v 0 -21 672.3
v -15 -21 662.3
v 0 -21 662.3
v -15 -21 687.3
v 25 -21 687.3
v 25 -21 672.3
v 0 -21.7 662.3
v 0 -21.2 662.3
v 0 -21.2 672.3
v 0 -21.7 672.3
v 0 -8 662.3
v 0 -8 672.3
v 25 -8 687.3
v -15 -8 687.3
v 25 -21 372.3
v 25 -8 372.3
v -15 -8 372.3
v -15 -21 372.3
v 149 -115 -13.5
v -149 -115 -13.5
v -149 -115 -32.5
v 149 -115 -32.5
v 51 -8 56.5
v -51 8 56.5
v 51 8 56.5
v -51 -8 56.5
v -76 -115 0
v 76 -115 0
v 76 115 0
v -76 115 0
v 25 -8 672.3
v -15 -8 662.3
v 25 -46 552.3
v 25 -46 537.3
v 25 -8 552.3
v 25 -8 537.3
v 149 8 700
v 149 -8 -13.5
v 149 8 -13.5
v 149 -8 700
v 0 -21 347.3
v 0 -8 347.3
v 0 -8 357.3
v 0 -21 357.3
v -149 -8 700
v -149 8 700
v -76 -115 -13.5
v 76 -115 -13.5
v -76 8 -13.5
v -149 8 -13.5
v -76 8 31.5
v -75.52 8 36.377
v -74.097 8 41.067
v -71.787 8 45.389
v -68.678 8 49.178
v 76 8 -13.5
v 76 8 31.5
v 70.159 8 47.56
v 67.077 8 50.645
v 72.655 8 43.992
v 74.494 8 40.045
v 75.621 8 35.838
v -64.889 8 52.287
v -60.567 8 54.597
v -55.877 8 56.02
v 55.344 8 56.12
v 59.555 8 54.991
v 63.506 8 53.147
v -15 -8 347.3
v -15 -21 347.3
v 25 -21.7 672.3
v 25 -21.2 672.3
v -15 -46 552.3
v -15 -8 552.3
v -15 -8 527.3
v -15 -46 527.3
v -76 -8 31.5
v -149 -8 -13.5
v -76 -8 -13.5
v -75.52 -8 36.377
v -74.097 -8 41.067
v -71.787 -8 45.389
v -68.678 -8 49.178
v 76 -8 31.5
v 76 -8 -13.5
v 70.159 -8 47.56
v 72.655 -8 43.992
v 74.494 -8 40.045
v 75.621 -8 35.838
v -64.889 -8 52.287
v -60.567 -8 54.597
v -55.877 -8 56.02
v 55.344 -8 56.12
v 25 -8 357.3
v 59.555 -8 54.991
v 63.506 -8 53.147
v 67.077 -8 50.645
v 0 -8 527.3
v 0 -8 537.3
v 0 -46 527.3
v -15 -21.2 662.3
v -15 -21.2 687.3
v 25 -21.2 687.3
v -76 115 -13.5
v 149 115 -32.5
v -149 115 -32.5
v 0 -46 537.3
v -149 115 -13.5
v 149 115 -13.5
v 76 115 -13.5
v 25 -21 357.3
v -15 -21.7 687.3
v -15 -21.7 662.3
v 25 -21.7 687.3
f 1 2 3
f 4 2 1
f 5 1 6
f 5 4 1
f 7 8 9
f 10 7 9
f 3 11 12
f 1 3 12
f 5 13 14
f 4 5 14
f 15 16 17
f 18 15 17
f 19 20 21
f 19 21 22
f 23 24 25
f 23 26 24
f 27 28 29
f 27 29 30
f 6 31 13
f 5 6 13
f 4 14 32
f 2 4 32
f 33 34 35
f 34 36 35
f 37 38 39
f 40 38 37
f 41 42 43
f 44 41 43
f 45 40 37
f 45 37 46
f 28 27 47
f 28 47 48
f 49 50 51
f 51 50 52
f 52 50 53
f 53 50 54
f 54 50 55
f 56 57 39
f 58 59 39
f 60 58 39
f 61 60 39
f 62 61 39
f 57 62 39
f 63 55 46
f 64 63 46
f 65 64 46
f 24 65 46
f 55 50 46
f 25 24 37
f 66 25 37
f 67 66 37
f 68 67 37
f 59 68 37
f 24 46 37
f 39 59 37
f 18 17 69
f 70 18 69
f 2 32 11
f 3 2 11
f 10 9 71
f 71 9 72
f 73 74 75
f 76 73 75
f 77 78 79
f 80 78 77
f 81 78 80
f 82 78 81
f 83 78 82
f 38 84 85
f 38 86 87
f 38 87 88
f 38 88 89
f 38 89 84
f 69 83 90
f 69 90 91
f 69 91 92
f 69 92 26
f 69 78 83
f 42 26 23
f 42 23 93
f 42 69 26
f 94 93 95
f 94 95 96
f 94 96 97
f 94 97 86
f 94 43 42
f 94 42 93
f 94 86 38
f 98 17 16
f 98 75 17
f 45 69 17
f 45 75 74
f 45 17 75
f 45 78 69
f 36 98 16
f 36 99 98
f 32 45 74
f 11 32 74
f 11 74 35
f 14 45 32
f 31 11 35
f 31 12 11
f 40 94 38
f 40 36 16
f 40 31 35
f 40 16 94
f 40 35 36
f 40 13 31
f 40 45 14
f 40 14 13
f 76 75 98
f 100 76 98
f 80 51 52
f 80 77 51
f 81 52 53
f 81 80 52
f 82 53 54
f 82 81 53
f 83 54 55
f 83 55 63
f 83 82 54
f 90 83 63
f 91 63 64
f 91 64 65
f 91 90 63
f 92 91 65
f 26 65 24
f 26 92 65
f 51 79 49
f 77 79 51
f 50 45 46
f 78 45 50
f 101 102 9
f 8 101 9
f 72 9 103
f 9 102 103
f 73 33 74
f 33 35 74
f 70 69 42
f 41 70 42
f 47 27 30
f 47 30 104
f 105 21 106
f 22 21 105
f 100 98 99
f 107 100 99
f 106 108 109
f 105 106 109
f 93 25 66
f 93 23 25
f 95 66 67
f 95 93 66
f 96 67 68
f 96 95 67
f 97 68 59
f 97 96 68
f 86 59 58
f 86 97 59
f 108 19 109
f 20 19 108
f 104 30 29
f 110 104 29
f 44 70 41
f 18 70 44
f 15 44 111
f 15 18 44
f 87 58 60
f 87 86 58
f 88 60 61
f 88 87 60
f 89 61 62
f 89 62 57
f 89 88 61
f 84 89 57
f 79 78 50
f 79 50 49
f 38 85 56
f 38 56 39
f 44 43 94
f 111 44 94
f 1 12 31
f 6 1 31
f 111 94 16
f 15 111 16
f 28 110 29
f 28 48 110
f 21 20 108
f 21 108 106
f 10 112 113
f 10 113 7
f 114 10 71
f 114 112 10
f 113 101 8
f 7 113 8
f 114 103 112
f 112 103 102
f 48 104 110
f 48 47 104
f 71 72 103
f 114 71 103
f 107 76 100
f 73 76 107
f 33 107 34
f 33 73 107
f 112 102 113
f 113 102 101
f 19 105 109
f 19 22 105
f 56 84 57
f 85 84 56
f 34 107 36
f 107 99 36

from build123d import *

# Parameters (mm, degrees)
F1_DEPTH      = 115
F1_DEPTH_BACK = 115
F2_DEPTH      = 115
F2_DEPTH_BACK = 115
F3_DEPTH      = 8
F3_DEPTH_BACK = 8
F4_DEPTH      = 21
F4_DEPTH_BACK = 8
F5_DEPTH      = 21
F5_DEPTH_BACK = 8
F6_DEPTH      = 21
F6_DEPTH_BACK = 8
F9_DEPTH      = 0.5
F11_DEPTH     = 25


with BuildPart() as f1:
    # F0 (on Front) → F1 (new body, two sides)
    with BuildSketch(Plane.XZ) as f1_sk:
        Polygon((76, -13.5), (76, 0), (0, 0), (-76, 0), (-76, -13.5), align=None)
    extrude(amount=F1_DEPTH)
    extrude(f1_sk.sketch, amount=-F1_DEPTH_BACK)


with BuildPart() as f2:
    # F0 (on Front) → F2 (new body, two sides)
    with BuildSketch(Plane.XZ) as f2_sk:
        Polygon((149, -13.5), (76, -13.5), (-76, -13.5), (-149, -13.5), (-149, -32.5), (149, -32.5), align=None)
    extrude(amount=F2_DEPTH)
    extrude(f2_sk.sketch, amount=-F2_DEPTH_BACK)


with BuildPart() as f3:
    # F0 (on Front) → F3 (new body, two sides)
    with BuildSketch(Plane.XZ) as f3_sk:
        with BuildLine():
            Line((76, 31.5), (76, 0))
            Line((76, 0), (76, -13.5))
            Line((76, -13.5), (149, -13.5))
            Line((149, -13.5), (149, 700))
            Line((149, 700), (-149, 700))
            Line((-149, 700), (-149, -13.5))
            Line((-149, -13.5), (-76, -13.5))
            Line((-76, -13.5), (-76, 0))
            Line((-76, 0), (-76, 31.5))
            ThreePointArc((-76, 31.5), (-68.6776695297, 49.1776695297), (-51, 56.5))
            Line((-51, 56.5), (51, 56.5))
            ThreePointArc((51, 56.5), (61.5710197798, 54.1550996647), (70.1590005334, 47.5602832653))
            ThreePointArc((70.1590005334, 47.5602832653), (74.4944143717, 40.044734831), (76, 31.5))
        make_face()
        Polygon((25, 357.3), (0, 357.3), (0, 347.3), (-15, 347.3), (-15, 372.3), (25, 372.3), align=None, mode=Mode.SUBTRACT)
        Polygon((25, 537.3), (0, 537.3), (0, 527.3), (-15, 527.3), (-15, 552.3), (25, 552.3), align=None, mode=Mode.SUBTRACT)
        Polygon((25, 672.3), (0, 672.3), (0, 662.3), (-15, 662.3), (-15, 687.3), (25, 687.3), align=None, mode=Mode.SUBTRACT)
    extrude(amount=F3_DEPTH)
    extrude(f3_sk.sketch, amount=-F3_DEPTH_BACK)

    # F0 (on Front) → F4 (join, two sides)
    with BuildSketch(Plane.XZ) as f4_sk:
        Polygon((0, 662.3), (0, 672.3), (25, 672.3), (25, 687.3), (-15, 687.3), (-15, 662.3), align=None)
    extrude(amount=F4_DEPTH)
    extrude(f4_sk.sketch, amount=-F4_DEPTH_BACK)

    # F0 (on Front) → F5 (join, two sides)
    with BuildSketch(Plane.XZ) as f5_sk:
        Polygon((0, 527.3), (0, 537.3), (25, 537.3), (25, 552.3), (-15, 552.3), (-15, 527.3), align=None)
    extrude(amount=F5_DEPTH)
    extrude(f5_sk.sketch, amount=-F5_DEPTH_BACK)

    # F0 (on Front) → F6 (join, two sides)
    with BuildSketch(Plane.XZ) as f6_sk:
        Polygon((0, 347.3), (0, 357.3), (25, 357.3), (25, 372.3), (-15, 372.3), (-15, 347.3), align=None)
    extrude(amount=F6_DEPTH)
    extrude(f6_sk.sketch, amount=-F6_DEPTH_BACK)

    # F11 (add): a face of the model
    f11_faces = [f3.faces().sort_by_distance(p)[0] for p in [
        (2.5, -21, 542.3),
    ]]
    extrude(f11_faces, amount=F11_DEPTH)


with BuildPart() as f9:
    # F8 (on offset) → F9 (new body)
    with BuildSketch(Plane.XZ.offset(21.2)):
        Polygon((25, 687.3), (-15, 687.3), (-15, 662.3), (0, 662.3), (0, 672.3), (25, 672.3), align=None)
    extrude(amount=F9_DEPTH)


solid = Compound([f1.part, f2.part, f3.part, f9.part])
